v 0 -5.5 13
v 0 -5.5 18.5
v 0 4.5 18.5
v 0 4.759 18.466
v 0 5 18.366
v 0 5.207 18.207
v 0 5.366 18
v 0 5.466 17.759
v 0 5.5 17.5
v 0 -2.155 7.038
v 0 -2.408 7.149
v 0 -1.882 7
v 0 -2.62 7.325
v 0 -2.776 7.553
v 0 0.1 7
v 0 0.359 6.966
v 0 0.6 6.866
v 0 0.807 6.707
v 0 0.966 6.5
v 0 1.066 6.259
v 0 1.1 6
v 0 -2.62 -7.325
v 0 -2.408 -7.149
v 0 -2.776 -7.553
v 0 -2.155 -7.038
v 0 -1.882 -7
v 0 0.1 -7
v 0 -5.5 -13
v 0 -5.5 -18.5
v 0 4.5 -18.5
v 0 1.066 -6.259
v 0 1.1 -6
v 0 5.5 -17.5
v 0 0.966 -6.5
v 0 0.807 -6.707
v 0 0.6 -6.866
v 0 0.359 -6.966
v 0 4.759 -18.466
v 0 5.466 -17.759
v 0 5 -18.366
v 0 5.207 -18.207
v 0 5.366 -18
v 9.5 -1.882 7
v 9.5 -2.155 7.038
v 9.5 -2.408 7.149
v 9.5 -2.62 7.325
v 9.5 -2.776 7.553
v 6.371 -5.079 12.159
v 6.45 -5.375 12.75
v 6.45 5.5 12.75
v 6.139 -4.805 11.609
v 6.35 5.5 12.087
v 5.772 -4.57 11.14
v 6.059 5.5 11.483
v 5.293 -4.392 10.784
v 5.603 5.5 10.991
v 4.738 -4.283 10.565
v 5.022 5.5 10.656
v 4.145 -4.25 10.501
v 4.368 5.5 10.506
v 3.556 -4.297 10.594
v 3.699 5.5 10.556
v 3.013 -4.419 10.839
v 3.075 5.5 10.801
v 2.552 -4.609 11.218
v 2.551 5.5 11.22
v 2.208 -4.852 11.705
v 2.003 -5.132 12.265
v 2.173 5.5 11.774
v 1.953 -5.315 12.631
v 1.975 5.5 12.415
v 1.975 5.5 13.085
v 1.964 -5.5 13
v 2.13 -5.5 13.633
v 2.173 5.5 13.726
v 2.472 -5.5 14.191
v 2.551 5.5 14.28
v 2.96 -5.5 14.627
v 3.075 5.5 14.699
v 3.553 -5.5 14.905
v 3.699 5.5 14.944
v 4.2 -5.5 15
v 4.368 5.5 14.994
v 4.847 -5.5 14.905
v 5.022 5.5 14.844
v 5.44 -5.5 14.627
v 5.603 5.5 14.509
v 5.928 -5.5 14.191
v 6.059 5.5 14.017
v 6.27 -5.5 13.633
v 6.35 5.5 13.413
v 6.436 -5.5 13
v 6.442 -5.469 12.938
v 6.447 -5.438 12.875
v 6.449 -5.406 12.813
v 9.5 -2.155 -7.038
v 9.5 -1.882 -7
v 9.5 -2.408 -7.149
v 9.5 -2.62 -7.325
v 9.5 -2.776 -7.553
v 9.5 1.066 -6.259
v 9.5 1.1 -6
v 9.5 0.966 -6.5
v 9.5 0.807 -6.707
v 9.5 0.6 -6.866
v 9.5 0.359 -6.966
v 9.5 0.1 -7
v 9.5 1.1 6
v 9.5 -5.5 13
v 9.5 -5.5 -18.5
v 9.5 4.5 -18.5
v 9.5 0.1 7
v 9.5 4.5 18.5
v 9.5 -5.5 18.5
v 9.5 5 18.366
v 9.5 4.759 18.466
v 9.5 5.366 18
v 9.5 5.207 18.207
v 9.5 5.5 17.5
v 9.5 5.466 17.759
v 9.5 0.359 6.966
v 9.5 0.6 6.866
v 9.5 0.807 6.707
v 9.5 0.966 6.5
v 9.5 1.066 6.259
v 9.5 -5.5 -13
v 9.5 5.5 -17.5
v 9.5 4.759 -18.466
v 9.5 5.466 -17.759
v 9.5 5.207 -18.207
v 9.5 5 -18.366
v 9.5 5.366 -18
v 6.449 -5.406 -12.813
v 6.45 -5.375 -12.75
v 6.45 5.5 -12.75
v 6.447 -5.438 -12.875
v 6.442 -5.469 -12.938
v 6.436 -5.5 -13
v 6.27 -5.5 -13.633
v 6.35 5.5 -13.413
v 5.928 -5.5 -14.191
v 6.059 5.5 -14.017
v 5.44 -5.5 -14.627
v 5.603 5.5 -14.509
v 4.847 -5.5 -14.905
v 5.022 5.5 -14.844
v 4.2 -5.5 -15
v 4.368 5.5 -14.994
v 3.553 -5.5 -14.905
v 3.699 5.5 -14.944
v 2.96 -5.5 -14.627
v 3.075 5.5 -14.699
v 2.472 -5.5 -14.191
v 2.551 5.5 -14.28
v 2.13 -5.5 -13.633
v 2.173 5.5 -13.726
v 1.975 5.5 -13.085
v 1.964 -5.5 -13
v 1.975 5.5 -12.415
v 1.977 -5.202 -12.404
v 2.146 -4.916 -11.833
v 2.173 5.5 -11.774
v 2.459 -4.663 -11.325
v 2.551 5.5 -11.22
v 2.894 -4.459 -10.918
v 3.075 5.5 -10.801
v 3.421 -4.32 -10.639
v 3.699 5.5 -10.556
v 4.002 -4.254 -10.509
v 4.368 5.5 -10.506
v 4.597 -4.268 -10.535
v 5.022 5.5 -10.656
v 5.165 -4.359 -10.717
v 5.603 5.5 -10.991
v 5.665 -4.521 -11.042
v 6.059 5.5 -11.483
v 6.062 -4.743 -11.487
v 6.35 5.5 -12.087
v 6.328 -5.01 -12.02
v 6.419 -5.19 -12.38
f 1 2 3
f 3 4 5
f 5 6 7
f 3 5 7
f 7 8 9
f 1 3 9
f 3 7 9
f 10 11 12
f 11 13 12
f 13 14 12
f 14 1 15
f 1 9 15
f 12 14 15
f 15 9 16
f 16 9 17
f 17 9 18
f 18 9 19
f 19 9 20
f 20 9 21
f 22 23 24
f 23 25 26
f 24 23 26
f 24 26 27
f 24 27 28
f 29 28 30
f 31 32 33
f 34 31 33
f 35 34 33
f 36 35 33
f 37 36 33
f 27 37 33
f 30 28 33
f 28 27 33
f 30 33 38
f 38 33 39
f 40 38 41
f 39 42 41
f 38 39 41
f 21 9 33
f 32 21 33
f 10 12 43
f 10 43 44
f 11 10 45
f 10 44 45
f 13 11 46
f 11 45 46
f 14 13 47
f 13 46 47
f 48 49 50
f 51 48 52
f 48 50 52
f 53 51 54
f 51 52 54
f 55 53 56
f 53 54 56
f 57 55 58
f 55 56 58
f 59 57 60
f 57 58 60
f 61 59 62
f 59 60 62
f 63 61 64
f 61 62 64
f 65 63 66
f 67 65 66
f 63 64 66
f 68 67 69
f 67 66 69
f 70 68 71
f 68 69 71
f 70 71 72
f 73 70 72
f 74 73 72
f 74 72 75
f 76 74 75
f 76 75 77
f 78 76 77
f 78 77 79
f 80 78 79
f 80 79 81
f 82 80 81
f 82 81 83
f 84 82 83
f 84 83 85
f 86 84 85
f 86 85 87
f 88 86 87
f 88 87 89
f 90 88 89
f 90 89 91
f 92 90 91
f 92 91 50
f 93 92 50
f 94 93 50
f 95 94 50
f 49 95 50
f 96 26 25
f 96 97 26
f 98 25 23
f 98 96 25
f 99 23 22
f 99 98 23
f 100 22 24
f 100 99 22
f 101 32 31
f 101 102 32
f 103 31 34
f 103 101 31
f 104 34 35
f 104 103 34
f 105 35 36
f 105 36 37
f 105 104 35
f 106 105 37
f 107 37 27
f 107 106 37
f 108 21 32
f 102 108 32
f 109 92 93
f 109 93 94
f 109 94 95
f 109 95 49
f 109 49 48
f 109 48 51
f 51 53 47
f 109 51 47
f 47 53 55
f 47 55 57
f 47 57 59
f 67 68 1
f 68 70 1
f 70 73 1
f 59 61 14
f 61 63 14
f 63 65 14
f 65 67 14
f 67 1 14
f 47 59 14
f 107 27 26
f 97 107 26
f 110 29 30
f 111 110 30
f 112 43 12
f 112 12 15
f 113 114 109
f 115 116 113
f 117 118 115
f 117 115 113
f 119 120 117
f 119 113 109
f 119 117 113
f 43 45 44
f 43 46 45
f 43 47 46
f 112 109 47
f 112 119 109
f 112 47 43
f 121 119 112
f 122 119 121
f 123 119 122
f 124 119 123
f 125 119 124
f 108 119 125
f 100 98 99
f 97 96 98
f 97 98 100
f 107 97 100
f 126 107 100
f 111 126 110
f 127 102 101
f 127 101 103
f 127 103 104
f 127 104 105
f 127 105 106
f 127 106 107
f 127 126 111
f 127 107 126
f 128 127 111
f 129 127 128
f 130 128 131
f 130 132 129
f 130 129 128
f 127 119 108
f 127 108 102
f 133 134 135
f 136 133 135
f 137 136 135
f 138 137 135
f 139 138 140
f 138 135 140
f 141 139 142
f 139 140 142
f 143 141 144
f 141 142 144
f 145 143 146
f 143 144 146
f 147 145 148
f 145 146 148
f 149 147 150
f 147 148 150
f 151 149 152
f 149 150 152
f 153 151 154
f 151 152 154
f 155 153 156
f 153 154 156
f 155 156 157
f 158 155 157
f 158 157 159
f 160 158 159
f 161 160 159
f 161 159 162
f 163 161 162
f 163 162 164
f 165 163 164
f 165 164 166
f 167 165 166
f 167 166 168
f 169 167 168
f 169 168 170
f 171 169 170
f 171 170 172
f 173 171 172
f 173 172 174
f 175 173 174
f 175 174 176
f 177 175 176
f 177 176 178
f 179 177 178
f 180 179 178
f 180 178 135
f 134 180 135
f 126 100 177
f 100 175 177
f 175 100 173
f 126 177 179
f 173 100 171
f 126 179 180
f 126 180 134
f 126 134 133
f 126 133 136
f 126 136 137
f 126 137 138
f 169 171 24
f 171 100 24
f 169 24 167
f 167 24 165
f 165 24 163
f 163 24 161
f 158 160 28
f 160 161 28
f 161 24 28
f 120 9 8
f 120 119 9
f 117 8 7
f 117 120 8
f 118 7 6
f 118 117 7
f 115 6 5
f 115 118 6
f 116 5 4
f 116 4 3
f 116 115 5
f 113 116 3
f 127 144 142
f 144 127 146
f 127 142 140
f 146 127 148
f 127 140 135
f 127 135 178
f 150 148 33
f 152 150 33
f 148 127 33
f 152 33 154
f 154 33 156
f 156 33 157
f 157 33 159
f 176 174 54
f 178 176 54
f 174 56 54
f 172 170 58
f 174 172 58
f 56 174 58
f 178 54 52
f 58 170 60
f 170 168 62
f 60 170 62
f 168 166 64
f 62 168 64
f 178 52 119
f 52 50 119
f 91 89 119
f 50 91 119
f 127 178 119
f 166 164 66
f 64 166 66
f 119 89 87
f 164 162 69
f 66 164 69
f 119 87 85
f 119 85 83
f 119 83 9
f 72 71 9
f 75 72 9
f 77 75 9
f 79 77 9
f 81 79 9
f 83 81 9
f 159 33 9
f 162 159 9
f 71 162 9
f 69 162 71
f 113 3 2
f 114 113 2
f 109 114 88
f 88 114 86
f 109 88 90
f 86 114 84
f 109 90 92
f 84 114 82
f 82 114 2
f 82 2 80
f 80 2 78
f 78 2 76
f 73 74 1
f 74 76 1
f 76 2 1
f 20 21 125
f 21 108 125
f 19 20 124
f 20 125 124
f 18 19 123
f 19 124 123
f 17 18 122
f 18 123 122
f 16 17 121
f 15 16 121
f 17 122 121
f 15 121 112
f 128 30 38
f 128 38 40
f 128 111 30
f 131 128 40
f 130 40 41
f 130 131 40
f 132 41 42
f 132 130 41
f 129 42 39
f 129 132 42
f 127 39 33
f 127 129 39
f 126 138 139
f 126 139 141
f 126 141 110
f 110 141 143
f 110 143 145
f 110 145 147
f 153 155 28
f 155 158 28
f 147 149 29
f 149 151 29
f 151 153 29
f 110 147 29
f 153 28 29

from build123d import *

# Parameters (mm, degrees)
BOSS_EXTRUDE1_DEPTH = 9.5
SKETCH2_R           = 2.25
CUT_EXTRUDE1_DEPTH  = 12
FILLET1_R           = 1


with BuildPart() as part:
    # Sketch1 → Boss-Extrude1 (new body)
    with BuildSketch(Plane(origin=(0, 0, 0), x_dir=(0, 0, -1), z_dir=(1, 0, 0))):
        Polygon((-7, 1.1), (7, 1.1), (7, -2.5), (13, -5.5), (18.5, -5.5), (18.5, 5.5), (-18.5, 5.5), (-18.5, -5.5), (-13, -5.5), (-7, -2.5), align=None)
    extrude(amount=BOSS_EXTRUDE1_DEPTH)

    # Sketch2 → Cut-Extrude1 (cut, through all)
    with BuildSketch(Plane(origin=(0, 5.5, 0), x_dir=(1, 0, 0), z_dir=(0, 1, 0))):
        with Locations((4.2, -12.75)):
            Circle(SKETCH2_R)
        with Locations((4.2, 12.75)):
            Circle(SKETCH2_R)
    extrude(amount=-CUT_EXTRUDE1_DEPTH, mode=Mode.SUBTRACT)

    # Fillet1
    fillet1_edges = [part.edges().sort_by_distance(p)[0] for p in [
        (4.75, 5.5, 18.5),
        (4.75, 5.5, -18.5),
        (4.75, -2.5, -7),
        (4.75, 1.1, -7),
        (4.75, 1.1, 7),
        (4.75, -2.5, 7),
    ]]
    fillet(fillet1_edges, radius=FILLET1_R)


solid = part.part
